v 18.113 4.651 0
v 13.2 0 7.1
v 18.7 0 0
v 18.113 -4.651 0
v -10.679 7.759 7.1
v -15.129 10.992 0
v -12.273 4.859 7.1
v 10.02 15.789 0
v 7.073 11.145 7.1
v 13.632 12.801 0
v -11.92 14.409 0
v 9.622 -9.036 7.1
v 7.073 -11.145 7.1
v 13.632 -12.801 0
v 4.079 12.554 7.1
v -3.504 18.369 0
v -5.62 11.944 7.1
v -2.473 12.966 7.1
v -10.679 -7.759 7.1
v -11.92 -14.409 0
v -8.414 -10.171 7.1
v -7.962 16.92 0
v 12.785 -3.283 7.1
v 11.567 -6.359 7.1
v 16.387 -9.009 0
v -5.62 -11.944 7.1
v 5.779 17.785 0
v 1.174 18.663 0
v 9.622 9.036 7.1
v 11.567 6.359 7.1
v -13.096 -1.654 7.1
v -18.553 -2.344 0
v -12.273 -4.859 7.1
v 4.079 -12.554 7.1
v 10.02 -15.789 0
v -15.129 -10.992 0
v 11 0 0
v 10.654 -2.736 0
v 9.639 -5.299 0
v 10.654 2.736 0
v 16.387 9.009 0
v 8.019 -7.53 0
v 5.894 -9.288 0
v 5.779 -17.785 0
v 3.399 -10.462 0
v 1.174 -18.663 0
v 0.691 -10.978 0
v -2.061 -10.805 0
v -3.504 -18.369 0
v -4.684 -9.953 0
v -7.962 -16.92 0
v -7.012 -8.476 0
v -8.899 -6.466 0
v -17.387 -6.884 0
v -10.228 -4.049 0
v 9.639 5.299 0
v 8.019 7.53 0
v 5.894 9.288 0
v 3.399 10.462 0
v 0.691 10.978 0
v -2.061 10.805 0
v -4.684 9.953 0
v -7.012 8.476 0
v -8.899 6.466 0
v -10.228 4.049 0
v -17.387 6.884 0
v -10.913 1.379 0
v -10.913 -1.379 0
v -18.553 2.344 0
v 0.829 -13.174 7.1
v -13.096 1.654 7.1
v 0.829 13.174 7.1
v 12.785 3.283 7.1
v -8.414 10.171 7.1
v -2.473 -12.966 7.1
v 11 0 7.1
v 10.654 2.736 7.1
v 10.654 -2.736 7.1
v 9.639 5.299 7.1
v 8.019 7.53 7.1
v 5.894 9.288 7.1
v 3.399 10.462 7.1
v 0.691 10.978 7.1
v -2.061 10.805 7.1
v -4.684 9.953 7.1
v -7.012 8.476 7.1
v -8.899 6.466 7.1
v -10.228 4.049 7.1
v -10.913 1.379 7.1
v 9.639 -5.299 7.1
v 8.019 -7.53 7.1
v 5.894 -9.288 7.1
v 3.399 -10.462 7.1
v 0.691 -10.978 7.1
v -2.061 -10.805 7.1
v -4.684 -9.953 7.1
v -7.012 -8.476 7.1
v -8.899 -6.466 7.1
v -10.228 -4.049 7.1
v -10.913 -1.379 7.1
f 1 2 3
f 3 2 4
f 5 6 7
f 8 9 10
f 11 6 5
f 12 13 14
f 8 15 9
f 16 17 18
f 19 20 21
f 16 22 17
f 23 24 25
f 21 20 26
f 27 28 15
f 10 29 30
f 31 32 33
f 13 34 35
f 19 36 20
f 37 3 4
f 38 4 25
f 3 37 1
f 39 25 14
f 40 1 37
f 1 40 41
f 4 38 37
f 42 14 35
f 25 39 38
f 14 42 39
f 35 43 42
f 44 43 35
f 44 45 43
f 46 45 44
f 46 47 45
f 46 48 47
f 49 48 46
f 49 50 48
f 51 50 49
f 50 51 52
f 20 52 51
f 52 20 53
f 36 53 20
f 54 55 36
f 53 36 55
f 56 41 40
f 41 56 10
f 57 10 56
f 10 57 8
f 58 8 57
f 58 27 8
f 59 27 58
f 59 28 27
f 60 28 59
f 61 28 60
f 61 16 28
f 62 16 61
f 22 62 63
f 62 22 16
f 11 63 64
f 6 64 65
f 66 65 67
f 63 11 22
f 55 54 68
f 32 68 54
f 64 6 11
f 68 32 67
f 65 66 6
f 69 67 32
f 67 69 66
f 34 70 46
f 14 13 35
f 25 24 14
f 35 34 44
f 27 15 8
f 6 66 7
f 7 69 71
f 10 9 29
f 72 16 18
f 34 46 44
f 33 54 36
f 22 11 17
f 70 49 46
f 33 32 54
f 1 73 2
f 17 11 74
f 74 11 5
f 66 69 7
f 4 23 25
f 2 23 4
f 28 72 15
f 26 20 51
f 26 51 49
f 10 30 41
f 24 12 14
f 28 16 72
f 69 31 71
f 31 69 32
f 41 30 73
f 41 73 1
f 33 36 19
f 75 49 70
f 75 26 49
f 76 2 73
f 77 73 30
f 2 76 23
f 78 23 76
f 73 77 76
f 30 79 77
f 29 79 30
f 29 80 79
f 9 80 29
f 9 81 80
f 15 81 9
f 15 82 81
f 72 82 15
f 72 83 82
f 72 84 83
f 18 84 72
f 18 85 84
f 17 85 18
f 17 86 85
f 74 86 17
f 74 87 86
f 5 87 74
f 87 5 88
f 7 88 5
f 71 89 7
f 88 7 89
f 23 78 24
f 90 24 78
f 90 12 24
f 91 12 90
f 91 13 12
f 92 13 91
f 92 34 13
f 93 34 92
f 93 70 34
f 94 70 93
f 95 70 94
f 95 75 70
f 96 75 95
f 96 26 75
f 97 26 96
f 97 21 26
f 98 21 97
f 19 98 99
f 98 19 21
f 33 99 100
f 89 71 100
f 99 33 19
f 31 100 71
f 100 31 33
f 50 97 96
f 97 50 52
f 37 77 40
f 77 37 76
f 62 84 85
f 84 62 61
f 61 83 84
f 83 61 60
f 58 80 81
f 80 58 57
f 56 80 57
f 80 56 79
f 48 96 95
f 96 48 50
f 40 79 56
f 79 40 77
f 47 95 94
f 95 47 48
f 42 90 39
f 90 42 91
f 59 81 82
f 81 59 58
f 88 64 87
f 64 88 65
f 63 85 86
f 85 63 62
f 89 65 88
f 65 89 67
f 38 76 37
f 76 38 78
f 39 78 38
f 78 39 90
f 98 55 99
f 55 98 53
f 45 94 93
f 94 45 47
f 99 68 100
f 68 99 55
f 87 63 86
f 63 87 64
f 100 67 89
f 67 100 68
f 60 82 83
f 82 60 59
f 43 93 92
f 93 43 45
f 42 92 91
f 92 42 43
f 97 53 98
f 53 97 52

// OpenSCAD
module cone_r608z(D=22*1.7, d=22*1.2, h=7+0.1, def=25){
    r608z_d=8;
    r608z_D=22;
    r608z_e=7;
    
    difference() {
        cylinder(h = h, d1 = D, d2 = d, $fn=def);
        translate([0,0,-0.1]) cylinder(d=r608z_D,h=r608z_e+0.3,$fn=def);
    }
    
}

cone_r608z();
